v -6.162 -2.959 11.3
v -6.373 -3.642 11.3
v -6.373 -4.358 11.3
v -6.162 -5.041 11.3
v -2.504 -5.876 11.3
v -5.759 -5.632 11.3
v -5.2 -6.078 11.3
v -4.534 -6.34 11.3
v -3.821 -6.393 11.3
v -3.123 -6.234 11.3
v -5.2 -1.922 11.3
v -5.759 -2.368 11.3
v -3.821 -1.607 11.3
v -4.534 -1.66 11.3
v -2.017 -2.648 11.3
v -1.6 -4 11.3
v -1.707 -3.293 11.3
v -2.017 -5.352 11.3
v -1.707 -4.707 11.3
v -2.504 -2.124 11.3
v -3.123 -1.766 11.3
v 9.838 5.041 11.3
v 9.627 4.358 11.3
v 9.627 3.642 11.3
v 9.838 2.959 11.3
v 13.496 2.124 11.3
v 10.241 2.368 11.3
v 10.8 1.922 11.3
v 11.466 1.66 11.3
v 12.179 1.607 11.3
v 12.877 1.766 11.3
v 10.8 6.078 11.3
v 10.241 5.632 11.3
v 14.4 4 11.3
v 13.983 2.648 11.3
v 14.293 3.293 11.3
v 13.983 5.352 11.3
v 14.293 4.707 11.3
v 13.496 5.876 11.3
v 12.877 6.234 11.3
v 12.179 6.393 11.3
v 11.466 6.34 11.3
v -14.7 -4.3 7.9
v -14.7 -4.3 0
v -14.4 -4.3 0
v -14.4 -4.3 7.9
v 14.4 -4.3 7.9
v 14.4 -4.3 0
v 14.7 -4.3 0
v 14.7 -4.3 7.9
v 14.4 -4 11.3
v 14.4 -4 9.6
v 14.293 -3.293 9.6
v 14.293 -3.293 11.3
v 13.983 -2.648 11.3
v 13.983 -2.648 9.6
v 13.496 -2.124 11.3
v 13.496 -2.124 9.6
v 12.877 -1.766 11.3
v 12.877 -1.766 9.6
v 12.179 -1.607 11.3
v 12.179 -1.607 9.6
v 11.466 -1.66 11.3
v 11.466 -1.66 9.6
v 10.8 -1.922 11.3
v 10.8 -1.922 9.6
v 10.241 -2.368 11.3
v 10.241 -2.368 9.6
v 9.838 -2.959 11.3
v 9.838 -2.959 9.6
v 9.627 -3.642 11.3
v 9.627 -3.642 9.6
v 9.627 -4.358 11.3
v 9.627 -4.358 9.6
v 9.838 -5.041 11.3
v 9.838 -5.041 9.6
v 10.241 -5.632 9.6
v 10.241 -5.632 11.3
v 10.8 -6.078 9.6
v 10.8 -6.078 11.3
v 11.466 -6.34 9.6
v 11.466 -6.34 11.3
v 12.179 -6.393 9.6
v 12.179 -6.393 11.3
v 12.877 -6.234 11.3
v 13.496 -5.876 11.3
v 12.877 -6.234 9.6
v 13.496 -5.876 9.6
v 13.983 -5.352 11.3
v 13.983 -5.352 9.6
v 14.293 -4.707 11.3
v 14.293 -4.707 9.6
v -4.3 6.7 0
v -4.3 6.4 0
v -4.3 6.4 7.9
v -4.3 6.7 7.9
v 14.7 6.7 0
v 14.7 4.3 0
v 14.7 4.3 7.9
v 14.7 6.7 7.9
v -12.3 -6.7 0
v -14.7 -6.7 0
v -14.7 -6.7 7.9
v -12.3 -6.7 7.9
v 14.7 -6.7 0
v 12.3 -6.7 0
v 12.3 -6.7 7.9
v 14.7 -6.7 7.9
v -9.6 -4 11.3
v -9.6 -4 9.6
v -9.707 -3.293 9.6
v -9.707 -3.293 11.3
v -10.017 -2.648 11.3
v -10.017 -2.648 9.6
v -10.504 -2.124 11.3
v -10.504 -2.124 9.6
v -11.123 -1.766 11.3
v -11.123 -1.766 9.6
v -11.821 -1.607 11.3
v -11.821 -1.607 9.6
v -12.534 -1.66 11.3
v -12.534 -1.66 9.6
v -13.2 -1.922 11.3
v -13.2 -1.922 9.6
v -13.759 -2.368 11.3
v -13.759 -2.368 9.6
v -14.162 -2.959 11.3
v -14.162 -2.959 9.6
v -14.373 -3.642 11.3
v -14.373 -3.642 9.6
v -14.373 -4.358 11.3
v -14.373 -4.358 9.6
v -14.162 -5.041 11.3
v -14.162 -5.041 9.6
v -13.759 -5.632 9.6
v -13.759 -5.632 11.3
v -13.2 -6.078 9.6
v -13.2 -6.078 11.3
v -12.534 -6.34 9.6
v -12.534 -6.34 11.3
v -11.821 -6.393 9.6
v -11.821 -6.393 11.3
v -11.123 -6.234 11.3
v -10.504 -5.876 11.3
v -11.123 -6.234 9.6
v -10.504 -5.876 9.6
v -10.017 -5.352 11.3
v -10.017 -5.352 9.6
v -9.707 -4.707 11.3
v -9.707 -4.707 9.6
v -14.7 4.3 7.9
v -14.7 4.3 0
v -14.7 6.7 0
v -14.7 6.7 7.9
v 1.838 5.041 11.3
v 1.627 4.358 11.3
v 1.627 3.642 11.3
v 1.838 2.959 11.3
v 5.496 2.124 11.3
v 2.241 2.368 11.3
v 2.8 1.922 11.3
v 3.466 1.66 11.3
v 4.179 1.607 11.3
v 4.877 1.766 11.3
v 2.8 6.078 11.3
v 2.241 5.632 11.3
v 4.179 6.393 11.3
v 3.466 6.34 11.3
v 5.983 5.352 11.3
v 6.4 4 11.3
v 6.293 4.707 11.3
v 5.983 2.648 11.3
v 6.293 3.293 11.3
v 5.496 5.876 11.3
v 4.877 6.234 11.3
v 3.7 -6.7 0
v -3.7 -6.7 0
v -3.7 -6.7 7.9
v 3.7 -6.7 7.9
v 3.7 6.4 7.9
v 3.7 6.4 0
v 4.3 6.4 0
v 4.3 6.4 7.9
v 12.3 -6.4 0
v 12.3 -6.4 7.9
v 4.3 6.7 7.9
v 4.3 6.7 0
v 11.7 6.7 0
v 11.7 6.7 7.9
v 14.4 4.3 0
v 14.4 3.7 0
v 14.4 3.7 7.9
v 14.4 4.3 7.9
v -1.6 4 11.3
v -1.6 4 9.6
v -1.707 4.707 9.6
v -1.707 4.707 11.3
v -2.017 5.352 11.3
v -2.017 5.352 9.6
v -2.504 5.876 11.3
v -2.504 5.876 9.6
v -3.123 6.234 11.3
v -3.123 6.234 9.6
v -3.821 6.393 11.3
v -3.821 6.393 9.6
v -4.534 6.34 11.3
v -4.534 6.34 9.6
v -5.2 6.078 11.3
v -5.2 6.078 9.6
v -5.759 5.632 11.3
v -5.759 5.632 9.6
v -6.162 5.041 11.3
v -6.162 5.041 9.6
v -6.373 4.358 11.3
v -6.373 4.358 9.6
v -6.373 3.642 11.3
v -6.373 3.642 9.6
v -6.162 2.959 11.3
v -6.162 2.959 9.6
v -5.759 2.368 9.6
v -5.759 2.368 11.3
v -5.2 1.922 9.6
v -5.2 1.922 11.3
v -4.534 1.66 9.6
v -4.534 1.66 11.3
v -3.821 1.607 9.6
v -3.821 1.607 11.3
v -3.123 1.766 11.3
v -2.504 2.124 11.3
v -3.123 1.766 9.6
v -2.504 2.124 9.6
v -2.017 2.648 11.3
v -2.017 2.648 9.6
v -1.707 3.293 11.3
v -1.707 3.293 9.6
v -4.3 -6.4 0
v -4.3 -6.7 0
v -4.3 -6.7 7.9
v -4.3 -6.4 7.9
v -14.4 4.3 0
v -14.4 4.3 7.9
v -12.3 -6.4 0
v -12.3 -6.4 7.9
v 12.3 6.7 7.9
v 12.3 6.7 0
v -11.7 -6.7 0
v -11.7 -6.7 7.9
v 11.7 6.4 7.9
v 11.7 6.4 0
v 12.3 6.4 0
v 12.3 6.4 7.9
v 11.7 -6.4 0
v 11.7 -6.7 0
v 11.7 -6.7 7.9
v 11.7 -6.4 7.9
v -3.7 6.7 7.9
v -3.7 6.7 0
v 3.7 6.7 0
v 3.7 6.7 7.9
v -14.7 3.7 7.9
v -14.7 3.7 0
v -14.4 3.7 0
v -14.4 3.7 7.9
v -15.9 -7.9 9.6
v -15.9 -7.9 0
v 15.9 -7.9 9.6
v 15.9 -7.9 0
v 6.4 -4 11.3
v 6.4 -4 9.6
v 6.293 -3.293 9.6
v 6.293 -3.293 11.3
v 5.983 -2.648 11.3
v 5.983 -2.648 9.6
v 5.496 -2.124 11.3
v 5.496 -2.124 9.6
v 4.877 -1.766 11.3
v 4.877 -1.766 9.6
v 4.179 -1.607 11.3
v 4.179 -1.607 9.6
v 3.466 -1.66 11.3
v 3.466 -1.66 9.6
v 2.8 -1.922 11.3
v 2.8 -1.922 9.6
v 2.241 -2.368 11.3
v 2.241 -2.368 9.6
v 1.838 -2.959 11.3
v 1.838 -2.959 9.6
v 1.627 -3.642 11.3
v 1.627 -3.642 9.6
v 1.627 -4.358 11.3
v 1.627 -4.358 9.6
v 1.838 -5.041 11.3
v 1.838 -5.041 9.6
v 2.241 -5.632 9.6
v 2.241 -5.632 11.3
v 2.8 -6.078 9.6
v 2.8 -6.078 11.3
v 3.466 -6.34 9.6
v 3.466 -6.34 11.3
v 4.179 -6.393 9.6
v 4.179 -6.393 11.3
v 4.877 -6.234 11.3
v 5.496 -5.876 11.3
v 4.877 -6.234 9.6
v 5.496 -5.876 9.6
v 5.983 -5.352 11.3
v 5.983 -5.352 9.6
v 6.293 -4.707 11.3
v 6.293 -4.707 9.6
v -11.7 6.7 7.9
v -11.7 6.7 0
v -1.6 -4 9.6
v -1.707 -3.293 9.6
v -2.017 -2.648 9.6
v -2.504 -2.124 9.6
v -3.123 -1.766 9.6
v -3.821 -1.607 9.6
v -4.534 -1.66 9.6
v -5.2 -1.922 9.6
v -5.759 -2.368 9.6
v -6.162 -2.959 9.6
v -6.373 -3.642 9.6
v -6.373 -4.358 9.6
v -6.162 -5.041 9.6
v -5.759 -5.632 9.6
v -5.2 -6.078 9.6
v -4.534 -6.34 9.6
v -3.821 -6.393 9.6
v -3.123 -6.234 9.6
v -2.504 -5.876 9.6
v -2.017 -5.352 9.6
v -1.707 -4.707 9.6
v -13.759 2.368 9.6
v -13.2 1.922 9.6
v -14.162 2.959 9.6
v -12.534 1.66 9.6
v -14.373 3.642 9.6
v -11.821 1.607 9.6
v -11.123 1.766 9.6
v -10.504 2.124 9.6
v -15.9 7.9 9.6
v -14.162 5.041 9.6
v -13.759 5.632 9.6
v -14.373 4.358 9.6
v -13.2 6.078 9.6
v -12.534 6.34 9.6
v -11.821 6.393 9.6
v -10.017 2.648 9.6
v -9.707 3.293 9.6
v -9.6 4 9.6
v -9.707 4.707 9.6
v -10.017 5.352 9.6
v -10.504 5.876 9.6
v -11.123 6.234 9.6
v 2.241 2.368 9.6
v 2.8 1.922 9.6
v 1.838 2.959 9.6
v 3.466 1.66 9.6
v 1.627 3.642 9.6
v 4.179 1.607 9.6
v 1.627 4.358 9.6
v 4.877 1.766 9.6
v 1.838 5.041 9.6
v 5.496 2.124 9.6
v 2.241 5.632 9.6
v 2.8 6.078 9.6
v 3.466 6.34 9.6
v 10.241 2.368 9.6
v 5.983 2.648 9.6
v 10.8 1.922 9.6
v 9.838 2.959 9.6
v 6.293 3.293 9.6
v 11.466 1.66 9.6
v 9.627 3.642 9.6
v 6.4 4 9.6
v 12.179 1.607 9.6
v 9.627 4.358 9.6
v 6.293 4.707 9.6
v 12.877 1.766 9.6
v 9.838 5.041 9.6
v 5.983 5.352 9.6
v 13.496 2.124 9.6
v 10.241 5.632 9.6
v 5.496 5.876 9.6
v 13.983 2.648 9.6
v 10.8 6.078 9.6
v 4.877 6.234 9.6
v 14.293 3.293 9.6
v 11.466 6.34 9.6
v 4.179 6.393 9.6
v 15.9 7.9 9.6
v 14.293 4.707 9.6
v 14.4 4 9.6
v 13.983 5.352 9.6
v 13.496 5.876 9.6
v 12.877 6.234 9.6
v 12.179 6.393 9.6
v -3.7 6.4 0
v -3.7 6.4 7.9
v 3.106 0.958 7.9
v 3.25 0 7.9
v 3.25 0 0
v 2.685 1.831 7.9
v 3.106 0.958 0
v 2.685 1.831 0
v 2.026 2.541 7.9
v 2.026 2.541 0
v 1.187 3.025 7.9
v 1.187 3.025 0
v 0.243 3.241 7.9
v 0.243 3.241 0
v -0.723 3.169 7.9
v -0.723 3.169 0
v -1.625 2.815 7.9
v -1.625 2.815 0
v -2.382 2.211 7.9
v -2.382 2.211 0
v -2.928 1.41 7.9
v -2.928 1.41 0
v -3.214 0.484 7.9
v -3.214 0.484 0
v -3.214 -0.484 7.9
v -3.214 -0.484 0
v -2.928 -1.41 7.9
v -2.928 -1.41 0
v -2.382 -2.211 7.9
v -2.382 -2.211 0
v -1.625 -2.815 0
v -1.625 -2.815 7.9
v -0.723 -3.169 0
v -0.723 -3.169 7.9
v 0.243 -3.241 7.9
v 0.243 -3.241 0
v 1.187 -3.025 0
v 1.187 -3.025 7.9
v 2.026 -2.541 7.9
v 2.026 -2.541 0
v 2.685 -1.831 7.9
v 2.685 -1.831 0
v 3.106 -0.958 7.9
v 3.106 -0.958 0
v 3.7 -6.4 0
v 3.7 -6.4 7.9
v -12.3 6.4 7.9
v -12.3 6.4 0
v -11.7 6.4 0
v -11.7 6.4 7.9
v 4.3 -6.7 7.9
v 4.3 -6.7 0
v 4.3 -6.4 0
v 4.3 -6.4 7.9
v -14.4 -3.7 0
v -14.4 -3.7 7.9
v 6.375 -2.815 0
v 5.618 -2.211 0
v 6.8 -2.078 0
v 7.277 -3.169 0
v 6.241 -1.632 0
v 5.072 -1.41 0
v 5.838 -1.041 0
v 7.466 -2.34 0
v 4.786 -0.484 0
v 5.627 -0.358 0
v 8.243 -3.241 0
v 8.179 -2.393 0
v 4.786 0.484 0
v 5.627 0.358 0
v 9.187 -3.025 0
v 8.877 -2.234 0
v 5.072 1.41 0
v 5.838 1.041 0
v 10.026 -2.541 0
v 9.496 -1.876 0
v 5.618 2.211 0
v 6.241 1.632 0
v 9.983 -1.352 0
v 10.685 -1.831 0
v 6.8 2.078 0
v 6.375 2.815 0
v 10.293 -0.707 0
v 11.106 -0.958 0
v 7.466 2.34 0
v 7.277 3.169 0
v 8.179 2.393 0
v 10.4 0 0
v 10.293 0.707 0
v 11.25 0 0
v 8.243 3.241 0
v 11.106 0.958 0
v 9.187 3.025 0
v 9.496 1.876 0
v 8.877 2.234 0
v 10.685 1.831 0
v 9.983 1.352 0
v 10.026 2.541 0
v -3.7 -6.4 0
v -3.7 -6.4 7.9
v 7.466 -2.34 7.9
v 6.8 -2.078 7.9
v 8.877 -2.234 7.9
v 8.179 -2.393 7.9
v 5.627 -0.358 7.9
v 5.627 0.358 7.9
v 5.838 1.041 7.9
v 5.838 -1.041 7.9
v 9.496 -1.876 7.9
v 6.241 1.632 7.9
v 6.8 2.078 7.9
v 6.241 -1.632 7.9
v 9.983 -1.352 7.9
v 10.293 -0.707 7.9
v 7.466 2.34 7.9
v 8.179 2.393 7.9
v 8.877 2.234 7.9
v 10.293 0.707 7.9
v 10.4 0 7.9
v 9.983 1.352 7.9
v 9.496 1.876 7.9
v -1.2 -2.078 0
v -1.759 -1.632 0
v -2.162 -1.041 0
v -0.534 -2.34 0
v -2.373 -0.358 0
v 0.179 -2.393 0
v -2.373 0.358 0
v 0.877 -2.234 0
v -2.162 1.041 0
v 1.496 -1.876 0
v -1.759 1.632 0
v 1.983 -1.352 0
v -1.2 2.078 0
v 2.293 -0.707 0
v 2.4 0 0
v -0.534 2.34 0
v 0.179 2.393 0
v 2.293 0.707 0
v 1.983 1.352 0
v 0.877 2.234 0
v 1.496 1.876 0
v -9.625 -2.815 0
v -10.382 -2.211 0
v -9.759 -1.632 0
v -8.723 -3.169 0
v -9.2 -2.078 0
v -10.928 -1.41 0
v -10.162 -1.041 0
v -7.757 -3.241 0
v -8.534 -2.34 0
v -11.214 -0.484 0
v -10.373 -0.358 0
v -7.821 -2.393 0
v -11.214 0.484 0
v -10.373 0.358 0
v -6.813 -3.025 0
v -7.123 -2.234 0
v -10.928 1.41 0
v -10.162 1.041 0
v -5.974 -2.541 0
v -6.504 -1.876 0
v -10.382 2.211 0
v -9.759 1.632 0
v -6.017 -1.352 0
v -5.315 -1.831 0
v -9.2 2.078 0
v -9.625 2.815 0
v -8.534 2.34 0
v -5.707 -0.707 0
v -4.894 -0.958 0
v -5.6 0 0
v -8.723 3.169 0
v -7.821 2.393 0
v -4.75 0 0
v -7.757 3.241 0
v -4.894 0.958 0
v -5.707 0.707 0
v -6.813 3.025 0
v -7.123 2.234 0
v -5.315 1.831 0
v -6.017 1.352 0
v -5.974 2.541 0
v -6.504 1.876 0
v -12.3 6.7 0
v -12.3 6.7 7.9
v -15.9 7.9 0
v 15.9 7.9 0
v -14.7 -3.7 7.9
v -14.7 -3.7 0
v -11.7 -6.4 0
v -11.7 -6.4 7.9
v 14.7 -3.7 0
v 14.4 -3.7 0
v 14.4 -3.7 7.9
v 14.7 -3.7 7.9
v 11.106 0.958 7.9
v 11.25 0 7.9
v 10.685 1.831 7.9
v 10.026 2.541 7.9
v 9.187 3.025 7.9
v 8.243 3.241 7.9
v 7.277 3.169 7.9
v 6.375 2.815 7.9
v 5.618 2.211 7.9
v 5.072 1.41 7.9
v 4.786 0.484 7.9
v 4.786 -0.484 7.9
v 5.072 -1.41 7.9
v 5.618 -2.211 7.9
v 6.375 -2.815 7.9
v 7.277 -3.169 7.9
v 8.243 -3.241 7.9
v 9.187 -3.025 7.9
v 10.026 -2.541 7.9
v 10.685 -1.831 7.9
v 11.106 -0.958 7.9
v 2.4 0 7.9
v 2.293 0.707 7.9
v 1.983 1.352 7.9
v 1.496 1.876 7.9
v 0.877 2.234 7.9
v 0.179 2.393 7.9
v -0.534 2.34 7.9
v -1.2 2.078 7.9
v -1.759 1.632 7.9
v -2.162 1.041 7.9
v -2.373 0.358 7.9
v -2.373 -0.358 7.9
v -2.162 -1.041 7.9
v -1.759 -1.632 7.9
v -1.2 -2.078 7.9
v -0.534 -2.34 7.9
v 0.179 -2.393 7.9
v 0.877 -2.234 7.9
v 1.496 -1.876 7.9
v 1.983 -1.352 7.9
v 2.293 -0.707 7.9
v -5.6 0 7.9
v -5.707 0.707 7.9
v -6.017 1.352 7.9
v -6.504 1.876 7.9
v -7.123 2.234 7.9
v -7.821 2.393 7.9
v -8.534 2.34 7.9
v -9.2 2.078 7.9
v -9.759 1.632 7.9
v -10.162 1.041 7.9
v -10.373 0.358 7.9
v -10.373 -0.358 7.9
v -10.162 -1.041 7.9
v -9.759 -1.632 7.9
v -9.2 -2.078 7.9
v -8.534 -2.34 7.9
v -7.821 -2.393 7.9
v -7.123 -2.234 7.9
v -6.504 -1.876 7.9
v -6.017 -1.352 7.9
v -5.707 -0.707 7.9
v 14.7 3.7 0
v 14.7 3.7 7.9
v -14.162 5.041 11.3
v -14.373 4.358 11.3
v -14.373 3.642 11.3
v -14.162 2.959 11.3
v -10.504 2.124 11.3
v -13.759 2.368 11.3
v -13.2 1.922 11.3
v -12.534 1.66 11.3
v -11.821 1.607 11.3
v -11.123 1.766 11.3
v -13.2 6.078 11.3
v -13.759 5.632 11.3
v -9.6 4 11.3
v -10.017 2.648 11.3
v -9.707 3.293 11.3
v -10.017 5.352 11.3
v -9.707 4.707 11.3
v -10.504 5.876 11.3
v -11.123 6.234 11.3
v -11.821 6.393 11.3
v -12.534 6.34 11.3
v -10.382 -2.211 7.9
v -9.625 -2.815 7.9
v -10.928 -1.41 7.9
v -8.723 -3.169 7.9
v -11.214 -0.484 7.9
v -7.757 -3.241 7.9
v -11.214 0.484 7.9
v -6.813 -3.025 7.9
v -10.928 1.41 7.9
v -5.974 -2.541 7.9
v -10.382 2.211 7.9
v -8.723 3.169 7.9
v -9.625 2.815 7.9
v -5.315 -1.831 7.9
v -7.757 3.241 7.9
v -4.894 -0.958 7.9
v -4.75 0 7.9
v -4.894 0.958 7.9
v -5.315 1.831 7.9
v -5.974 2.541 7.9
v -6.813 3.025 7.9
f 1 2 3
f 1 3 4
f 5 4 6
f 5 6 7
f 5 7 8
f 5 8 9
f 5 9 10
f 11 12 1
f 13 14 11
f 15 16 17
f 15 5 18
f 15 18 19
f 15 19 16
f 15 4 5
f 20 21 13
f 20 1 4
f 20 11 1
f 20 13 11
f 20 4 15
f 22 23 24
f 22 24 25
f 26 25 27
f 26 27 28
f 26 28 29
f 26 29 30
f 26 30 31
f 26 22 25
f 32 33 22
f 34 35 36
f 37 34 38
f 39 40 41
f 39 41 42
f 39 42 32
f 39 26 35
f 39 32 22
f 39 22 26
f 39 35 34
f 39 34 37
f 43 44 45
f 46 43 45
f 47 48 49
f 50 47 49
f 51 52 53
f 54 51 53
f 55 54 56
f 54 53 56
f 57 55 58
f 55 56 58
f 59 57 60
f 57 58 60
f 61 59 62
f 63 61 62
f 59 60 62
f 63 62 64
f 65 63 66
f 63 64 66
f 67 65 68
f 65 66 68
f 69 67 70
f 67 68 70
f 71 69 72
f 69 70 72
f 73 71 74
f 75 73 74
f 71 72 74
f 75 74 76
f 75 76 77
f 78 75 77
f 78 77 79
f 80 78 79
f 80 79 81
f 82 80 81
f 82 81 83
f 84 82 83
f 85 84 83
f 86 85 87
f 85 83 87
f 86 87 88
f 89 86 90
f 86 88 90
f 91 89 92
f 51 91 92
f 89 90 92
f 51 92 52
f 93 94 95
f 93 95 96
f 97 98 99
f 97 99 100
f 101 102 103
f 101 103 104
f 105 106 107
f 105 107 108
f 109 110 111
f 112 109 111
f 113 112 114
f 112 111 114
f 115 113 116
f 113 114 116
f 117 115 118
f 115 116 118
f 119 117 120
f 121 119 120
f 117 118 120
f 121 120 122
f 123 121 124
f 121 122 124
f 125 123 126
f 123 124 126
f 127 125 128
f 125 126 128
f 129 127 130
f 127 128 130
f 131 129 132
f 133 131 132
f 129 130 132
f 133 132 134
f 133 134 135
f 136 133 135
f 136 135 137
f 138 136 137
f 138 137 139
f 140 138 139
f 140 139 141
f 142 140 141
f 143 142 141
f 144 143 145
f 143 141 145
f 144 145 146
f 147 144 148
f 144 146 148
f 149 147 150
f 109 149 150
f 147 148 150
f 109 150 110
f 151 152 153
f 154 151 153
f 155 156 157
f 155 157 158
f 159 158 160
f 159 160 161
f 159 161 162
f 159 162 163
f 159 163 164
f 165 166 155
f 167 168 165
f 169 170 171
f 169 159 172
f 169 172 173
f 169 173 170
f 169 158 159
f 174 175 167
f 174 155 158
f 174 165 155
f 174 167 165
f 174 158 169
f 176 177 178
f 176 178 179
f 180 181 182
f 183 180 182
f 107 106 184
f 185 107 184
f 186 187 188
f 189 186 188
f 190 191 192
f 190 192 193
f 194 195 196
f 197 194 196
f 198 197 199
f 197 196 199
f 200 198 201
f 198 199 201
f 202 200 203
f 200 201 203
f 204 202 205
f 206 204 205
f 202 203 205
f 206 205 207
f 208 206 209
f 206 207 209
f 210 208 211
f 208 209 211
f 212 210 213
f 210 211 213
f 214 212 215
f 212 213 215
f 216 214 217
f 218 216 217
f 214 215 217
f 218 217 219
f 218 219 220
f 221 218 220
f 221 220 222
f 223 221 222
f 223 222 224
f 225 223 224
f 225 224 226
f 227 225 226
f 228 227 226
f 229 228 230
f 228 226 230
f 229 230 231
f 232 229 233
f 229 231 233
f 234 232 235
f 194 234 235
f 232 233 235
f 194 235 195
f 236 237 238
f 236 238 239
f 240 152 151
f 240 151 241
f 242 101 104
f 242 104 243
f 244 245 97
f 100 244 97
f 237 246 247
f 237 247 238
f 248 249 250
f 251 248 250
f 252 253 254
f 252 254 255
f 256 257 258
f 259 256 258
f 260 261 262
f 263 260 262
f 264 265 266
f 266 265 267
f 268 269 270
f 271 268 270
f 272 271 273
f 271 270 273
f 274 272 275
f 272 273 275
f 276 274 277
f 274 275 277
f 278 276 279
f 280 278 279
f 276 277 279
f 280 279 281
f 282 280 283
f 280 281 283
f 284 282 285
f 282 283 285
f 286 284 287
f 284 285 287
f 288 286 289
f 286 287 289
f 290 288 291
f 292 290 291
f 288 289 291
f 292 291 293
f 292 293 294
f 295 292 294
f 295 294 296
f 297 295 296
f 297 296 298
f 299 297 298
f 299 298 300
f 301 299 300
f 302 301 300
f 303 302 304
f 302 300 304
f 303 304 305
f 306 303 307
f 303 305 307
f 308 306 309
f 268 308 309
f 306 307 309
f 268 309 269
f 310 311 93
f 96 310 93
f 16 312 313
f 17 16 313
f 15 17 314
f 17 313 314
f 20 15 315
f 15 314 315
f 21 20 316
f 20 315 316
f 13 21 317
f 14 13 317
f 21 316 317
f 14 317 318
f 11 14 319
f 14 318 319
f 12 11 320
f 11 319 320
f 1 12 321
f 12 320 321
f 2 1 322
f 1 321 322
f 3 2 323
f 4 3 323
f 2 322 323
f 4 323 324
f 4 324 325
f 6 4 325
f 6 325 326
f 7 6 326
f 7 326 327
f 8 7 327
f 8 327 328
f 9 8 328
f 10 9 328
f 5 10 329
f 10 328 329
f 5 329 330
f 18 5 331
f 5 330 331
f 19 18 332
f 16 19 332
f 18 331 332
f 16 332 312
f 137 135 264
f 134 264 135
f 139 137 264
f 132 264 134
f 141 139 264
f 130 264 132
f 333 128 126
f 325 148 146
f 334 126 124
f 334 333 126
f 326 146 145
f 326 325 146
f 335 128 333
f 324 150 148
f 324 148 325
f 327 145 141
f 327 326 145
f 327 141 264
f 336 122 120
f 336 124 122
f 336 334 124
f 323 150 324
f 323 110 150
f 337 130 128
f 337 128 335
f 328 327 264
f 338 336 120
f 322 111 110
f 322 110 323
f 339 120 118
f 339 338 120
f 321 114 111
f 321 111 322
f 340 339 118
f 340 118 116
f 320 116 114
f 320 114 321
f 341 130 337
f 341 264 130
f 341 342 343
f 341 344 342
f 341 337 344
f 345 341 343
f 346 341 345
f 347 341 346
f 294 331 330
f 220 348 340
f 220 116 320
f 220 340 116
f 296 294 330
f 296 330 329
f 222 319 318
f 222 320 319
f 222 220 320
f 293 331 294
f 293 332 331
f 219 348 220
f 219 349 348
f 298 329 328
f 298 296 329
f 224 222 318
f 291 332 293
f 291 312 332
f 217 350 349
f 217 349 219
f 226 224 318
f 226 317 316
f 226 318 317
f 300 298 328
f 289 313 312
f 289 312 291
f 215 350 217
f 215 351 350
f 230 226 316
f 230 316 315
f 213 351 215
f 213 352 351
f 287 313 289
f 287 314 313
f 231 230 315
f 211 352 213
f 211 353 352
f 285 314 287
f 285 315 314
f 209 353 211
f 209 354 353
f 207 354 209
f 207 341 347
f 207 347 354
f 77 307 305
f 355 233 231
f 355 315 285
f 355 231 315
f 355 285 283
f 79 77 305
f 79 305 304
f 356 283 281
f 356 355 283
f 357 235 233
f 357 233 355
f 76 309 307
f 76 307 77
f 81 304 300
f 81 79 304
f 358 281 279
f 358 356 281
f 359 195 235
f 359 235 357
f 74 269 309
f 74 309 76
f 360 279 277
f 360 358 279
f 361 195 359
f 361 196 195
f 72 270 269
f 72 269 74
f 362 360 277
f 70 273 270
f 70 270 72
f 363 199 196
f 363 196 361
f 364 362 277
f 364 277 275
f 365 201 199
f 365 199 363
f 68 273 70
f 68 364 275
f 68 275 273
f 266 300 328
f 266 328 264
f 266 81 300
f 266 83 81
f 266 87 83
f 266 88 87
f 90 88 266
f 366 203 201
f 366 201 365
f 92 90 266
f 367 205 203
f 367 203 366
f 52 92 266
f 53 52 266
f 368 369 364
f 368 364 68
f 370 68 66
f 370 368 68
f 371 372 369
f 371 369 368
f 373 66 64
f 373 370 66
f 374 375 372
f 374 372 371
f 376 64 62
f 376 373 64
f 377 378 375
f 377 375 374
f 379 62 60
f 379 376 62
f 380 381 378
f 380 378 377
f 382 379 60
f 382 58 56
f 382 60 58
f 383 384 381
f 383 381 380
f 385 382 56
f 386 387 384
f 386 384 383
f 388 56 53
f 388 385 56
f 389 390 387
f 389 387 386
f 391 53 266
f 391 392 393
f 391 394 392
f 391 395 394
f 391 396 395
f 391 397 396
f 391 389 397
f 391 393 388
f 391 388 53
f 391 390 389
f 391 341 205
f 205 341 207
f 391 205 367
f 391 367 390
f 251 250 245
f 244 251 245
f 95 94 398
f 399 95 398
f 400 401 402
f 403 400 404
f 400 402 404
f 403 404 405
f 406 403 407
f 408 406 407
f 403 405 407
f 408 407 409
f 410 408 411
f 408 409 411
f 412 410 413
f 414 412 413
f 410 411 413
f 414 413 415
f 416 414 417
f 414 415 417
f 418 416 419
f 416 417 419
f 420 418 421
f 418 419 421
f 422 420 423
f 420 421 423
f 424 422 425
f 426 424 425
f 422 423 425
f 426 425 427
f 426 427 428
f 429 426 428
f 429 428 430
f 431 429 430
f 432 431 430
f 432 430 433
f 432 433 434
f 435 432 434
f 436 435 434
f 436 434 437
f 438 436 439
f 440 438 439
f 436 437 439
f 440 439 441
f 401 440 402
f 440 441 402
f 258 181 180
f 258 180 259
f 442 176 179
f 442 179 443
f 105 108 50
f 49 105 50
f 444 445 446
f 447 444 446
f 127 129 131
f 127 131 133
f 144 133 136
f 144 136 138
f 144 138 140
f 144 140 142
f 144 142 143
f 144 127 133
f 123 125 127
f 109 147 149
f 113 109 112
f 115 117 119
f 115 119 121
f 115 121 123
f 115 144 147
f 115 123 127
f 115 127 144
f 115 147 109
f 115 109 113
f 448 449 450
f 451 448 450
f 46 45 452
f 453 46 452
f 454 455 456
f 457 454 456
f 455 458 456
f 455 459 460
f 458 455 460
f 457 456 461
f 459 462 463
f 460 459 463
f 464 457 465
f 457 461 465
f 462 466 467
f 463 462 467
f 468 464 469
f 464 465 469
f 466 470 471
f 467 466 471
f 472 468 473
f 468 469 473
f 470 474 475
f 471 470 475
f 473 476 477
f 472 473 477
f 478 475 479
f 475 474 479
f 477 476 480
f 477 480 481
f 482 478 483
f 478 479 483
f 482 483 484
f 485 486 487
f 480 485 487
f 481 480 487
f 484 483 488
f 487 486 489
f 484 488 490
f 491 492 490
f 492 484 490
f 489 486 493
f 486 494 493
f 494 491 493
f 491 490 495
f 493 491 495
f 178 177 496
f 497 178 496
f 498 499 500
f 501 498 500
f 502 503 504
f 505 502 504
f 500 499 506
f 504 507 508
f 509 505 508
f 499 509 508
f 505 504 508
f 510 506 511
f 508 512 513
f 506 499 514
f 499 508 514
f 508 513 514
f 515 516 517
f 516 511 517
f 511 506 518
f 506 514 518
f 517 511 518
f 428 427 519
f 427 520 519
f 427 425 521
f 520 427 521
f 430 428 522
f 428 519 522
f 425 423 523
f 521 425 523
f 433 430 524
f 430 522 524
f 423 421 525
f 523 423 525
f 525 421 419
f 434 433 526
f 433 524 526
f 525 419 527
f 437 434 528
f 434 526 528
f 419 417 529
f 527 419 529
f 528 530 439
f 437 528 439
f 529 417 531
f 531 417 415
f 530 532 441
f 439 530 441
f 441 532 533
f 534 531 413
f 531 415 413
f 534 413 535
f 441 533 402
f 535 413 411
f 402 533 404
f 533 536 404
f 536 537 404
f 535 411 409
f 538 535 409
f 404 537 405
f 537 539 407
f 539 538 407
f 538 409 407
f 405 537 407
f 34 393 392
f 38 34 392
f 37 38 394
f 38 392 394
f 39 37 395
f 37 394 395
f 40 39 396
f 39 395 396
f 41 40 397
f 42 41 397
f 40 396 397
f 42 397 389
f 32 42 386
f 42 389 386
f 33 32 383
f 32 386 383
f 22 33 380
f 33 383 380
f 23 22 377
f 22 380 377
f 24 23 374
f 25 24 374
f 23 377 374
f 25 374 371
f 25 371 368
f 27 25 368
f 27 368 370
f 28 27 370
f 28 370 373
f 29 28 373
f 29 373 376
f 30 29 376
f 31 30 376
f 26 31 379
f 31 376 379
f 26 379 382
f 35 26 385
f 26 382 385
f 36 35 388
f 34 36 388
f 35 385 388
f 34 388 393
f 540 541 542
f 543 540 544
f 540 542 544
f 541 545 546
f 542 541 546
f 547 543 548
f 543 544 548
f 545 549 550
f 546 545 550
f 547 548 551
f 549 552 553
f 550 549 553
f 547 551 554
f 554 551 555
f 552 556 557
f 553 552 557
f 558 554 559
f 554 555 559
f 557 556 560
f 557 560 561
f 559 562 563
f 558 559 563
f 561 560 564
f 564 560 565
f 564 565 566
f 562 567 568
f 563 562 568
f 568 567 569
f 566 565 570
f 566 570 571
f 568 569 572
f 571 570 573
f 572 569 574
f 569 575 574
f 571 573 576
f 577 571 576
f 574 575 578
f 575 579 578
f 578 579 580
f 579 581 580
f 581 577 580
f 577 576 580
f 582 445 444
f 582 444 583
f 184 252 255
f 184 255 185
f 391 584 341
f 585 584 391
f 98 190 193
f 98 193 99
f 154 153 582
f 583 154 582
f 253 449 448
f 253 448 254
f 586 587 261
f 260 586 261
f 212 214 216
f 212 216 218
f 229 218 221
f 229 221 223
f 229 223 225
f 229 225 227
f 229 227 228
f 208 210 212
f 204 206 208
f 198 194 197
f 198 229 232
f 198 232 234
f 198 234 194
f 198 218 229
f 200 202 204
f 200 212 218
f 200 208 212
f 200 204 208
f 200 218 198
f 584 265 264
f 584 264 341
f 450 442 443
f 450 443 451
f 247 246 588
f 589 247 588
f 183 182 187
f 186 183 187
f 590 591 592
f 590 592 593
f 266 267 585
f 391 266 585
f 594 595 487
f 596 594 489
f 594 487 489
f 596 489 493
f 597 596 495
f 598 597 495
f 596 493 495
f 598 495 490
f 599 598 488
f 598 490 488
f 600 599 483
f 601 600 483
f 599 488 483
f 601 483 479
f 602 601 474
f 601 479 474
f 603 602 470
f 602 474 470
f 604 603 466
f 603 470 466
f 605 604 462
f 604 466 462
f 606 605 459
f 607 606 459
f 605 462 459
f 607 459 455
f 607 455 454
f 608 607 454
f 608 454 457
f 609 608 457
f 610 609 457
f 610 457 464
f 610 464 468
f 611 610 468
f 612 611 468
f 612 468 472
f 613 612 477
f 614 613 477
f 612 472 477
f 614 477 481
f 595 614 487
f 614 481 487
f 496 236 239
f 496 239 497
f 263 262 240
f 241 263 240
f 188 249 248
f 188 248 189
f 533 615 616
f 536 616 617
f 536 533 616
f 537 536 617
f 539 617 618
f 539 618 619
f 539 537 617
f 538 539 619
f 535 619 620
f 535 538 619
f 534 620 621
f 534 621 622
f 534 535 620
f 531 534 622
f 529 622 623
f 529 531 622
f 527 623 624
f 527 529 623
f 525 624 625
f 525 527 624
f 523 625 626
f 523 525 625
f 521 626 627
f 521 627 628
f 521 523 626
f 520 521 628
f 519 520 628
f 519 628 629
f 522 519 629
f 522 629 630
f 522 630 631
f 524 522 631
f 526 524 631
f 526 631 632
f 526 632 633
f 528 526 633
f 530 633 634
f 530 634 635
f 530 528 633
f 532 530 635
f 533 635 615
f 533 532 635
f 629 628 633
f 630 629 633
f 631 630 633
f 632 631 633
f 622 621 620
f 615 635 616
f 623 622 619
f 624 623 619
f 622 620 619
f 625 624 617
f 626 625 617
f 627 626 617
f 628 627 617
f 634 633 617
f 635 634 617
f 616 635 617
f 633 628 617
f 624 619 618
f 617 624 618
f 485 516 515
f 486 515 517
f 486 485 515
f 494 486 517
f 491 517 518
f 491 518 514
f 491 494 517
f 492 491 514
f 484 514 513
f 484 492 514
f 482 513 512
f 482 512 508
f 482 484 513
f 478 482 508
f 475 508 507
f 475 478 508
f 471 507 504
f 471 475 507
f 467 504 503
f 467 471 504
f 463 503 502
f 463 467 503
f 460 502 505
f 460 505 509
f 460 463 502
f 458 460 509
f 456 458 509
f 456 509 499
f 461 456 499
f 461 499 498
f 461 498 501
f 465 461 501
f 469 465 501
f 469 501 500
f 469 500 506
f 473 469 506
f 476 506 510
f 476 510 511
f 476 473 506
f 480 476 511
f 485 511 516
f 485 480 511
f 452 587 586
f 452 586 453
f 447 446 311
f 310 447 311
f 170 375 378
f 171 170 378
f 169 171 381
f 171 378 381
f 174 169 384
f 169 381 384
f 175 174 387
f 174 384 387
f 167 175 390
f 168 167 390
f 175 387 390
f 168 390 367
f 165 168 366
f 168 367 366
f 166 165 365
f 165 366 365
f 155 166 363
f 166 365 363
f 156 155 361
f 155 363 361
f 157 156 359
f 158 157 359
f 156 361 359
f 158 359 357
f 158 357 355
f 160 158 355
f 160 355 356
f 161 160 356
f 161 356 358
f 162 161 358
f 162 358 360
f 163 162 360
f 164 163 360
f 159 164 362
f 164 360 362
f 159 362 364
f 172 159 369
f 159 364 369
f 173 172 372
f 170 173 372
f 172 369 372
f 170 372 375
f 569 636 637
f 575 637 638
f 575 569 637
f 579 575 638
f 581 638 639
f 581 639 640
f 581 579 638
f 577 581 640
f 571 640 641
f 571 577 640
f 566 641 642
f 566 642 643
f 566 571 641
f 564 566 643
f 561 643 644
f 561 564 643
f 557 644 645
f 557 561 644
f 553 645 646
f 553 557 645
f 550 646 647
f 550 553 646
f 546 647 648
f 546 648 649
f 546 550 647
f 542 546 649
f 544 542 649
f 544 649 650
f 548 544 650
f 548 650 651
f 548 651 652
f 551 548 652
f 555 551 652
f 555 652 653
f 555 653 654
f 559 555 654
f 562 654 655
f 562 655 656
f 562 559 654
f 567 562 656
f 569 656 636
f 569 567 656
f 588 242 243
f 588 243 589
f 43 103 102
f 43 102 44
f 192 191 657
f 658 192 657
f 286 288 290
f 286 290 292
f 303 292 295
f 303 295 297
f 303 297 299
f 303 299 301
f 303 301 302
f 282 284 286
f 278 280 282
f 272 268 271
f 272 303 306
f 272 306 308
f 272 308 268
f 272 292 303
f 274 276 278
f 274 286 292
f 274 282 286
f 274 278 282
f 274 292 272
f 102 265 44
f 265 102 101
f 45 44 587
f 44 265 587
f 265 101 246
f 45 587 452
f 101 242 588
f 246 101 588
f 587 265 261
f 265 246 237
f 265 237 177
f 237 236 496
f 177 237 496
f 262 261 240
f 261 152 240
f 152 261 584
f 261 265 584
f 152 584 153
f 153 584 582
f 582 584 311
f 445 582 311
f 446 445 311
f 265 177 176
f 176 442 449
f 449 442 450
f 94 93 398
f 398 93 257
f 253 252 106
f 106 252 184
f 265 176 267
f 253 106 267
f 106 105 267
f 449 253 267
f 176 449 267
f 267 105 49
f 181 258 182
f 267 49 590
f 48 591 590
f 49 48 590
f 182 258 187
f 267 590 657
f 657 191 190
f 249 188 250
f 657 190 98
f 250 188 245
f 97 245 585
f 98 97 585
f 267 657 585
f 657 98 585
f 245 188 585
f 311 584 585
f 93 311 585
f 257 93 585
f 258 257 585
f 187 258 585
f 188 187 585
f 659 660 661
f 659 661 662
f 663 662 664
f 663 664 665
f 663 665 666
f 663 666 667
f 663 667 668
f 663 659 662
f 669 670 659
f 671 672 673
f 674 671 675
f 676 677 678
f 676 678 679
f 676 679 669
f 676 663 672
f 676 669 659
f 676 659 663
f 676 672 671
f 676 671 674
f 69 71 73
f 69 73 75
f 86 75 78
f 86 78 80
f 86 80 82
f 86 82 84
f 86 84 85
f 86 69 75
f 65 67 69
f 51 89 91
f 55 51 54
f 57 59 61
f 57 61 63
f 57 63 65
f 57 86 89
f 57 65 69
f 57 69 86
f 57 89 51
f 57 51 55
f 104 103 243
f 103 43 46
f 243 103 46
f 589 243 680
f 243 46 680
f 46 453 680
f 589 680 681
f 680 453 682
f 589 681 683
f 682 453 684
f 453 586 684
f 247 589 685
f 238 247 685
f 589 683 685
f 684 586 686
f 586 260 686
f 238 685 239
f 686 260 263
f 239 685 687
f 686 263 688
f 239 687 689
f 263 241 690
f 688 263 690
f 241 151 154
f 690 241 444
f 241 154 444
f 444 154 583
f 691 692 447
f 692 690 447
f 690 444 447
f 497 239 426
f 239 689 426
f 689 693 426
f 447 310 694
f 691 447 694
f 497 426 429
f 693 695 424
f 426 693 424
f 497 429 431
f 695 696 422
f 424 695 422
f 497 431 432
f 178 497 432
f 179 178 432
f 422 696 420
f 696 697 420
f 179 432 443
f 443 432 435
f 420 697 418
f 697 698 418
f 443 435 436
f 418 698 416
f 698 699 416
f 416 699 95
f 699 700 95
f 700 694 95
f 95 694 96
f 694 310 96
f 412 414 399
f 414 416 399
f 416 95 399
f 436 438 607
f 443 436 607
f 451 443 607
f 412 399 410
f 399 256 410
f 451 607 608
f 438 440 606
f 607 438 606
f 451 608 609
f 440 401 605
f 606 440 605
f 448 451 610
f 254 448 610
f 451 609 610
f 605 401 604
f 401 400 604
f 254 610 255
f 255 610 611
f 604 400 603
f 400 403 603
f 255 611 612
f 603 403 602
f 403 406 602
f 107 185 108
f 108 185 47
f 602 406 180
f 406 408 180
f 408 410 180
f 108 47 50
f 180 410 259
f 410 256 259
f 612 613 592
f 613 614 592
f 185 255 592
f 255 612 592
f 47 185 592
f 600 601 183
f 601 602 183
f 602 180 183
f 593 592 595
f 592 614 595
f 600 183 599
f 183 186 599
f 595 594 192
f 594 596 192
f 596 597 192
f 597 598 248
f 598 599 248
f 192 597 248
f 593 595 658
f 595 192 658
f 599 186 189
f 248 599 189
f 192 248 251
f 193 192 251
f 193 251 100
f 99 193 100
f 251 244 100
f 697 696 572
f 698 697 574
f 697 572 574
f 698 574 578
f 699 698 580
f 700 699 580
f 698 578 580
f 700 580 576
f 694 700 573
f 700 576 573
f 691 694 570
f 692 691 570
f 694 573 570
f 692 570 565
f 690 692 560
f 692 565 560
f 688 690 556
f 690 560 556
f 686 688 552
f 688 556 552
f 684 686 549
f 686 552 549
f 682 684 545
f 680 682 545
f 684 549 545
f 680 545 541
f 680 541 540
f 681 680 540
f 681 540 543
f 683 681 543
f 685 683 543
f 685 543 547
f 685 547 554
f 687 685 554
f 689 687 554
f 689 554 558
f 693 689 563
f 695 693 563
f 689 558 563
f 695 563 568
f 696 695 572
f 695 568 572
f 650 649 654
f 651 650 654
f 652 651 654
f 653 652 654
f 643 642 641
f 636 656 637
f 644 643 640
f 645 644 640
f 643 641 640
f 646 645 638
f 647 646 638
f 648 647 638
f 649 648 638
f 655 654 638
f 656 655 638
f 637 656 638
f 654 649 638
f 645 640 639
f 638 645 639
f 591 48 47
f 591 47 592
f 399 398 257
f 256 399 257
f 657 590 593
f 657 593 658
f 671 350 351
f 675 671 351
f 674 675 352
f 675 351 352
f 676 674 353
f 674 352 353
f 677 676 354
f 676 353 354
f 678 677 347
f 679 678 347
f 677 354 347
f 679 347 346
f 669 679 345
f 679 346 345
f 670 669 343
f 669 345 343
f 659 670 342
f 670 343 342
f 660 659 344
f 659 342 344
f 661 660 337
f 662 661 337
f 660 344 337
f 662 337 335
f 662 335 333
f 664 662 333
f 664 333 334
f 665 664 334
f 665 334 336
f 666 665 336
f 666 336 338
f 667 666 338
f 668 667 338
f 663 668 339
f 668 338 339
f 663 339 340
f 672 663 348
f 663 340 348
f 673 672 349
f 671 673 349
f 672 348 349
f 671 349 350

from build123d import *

# Parameters (mm, degrees)
F0_W     = 31.8
F0_H     = 15.8
F0_W_2   = 29.4
F0_H_2   = 13.4
F0_R     = 3.25
F0_R_2   = 2.4
F1_DEPTH = 9.6
F2_DEPTH = 7.9
F3_R     = 2.4
F4_DEPTH = 1.7
F5_W     = 0.6
F5_H     = 0.3
F5_W_2   = 0.3
F5_H_2   = 0.6
F6_DEPTH = 7.9


# Not quite as in the source:
# - a feature names something its author has since deleted; it is built from what else it names


with BuildPart() as f1:
    # F0 (on Top) → F1 (new body)
    with BuildSketch(Plane.XY):
        Rectangle(F0_W, F0_H)
        Rectangle(F0_W_2, F0_H_2, mode=Mode.SUBTRACT)
        Rectangle(F0_W_2, F0_H_2)
        with Locations((-8, 0)):
            Circle(F0_R, mode=Mode.SUBTRACT)
        Circle(F0_R, mode=Mode.SUBTRACT)
        with Locations((8, 0)):
            Circle(F0_R, mode=Mode.SUBTRACT)
        with Locations((-8, 0)):
            Circle(F0_R)
        with Locations((-8, 0)):
            Circle(F0_R_2, mode=Mode.SUBTRACT)
        Circle(F0_R)
        Circle(F0_R_2, mode=Mode.SUBTRACT)
        with Locations((8, 0)):
            Circle(F0_R)
        with Locations((8, 0)):
            Circle(F0_R_2, mode=Mode.SUBTRACT)
        with Locations((-8, 0)):
            Circle(F0_R_2)
        Circle(F0_R_2)
        with Locations((8, 0)):
            Circle(F0_R_2)
    extrude(amount=F1_DEPTH)

    # F0 (on Top) → F2 (cut)
    with BuildSketch(Plane.XY):
        Rectangle(F0_W_2, F0_H_2)
        with Locations((-8, 0)):
            Circle(F0_R, mode=Mode.SUBTRACT)
        Circle(F0_R, mode=Mode.SUBTRACT)
        with Locations((8, 0)):
            Circle(F0_R, mode=Mode.SUBTRACT)
        with Locations((-8, 0)):
            Circle(F0_R_2)
        with Locations((8, 0)):
            Circle(F0_R_2)
        Circle(F0_R_2)
    extrude(amount=F2_DEPTH, mode=Mode.SUBTRACT)

    # F3 (on face) → F4 (join)
    with BuildSketch(Plane.XY.offset(9.6)):
        with Locations((-12, 4)):
            Circle(F3_R)
        with Locations((-12, -4)):
            Circle(F3_R)
        with Locations((-4, 4)):
            Circle(F3_R)
        with Locations((-4, -4)):
            Circle(F3_R)
        with Locations((4, 4)):
            Circle(F3_R)
        with Locations((4, -4)):
            Circle(F3_R)
        with Locations((12, 4)):
            Circle(F3_R)
        with Locations((12, -4)):
            Circle(F3_R)
    extrude(amount=F4_DEPTH)

    # F5 (on Top) → F6 (join, through all)
    with BuildSketch(Plane.XY):
        with Locations((-12, -6.55)):
            Rectangle(F5_W, F5_H)
        with Locations((-4, -6.55)):
            Rectangle(F5_W, F5_H)
        with Locations((-14.55, -4)):
            Rectangle(F5_W_2, F5_H_2)
        with Locations((4, -6.55)):
            Rectangle(F5_W, F5_H)
        with Locations((12, -6.55)):
            Rectangle(F5_W, F5_H)
        with Locations((14.55, -4)):
            Rectangle(F5_W_2, F5_H_2)
        with Locations((-4, 6.55)):
            Rectangle(F5_W, F5_H)
        with Locations((14.55, 4)):
            Rectangle(F5_W_2, F5_H_2)
        with Locations((12, 6.55)):
            Rectangle(F5_W, F5_H)
        with Locations((-12, 6.55)):
            Rectangle(F5_W, F5_H)
        with Locations((-14.55, 4)):
            Rectangle(F5_W_2, F5_H_2)
        with Locations((4, 6.55)):
            Rectangle(F5_W, F5_H)
    extrude(amount=F6_DEPTH)


solid = f1.part
